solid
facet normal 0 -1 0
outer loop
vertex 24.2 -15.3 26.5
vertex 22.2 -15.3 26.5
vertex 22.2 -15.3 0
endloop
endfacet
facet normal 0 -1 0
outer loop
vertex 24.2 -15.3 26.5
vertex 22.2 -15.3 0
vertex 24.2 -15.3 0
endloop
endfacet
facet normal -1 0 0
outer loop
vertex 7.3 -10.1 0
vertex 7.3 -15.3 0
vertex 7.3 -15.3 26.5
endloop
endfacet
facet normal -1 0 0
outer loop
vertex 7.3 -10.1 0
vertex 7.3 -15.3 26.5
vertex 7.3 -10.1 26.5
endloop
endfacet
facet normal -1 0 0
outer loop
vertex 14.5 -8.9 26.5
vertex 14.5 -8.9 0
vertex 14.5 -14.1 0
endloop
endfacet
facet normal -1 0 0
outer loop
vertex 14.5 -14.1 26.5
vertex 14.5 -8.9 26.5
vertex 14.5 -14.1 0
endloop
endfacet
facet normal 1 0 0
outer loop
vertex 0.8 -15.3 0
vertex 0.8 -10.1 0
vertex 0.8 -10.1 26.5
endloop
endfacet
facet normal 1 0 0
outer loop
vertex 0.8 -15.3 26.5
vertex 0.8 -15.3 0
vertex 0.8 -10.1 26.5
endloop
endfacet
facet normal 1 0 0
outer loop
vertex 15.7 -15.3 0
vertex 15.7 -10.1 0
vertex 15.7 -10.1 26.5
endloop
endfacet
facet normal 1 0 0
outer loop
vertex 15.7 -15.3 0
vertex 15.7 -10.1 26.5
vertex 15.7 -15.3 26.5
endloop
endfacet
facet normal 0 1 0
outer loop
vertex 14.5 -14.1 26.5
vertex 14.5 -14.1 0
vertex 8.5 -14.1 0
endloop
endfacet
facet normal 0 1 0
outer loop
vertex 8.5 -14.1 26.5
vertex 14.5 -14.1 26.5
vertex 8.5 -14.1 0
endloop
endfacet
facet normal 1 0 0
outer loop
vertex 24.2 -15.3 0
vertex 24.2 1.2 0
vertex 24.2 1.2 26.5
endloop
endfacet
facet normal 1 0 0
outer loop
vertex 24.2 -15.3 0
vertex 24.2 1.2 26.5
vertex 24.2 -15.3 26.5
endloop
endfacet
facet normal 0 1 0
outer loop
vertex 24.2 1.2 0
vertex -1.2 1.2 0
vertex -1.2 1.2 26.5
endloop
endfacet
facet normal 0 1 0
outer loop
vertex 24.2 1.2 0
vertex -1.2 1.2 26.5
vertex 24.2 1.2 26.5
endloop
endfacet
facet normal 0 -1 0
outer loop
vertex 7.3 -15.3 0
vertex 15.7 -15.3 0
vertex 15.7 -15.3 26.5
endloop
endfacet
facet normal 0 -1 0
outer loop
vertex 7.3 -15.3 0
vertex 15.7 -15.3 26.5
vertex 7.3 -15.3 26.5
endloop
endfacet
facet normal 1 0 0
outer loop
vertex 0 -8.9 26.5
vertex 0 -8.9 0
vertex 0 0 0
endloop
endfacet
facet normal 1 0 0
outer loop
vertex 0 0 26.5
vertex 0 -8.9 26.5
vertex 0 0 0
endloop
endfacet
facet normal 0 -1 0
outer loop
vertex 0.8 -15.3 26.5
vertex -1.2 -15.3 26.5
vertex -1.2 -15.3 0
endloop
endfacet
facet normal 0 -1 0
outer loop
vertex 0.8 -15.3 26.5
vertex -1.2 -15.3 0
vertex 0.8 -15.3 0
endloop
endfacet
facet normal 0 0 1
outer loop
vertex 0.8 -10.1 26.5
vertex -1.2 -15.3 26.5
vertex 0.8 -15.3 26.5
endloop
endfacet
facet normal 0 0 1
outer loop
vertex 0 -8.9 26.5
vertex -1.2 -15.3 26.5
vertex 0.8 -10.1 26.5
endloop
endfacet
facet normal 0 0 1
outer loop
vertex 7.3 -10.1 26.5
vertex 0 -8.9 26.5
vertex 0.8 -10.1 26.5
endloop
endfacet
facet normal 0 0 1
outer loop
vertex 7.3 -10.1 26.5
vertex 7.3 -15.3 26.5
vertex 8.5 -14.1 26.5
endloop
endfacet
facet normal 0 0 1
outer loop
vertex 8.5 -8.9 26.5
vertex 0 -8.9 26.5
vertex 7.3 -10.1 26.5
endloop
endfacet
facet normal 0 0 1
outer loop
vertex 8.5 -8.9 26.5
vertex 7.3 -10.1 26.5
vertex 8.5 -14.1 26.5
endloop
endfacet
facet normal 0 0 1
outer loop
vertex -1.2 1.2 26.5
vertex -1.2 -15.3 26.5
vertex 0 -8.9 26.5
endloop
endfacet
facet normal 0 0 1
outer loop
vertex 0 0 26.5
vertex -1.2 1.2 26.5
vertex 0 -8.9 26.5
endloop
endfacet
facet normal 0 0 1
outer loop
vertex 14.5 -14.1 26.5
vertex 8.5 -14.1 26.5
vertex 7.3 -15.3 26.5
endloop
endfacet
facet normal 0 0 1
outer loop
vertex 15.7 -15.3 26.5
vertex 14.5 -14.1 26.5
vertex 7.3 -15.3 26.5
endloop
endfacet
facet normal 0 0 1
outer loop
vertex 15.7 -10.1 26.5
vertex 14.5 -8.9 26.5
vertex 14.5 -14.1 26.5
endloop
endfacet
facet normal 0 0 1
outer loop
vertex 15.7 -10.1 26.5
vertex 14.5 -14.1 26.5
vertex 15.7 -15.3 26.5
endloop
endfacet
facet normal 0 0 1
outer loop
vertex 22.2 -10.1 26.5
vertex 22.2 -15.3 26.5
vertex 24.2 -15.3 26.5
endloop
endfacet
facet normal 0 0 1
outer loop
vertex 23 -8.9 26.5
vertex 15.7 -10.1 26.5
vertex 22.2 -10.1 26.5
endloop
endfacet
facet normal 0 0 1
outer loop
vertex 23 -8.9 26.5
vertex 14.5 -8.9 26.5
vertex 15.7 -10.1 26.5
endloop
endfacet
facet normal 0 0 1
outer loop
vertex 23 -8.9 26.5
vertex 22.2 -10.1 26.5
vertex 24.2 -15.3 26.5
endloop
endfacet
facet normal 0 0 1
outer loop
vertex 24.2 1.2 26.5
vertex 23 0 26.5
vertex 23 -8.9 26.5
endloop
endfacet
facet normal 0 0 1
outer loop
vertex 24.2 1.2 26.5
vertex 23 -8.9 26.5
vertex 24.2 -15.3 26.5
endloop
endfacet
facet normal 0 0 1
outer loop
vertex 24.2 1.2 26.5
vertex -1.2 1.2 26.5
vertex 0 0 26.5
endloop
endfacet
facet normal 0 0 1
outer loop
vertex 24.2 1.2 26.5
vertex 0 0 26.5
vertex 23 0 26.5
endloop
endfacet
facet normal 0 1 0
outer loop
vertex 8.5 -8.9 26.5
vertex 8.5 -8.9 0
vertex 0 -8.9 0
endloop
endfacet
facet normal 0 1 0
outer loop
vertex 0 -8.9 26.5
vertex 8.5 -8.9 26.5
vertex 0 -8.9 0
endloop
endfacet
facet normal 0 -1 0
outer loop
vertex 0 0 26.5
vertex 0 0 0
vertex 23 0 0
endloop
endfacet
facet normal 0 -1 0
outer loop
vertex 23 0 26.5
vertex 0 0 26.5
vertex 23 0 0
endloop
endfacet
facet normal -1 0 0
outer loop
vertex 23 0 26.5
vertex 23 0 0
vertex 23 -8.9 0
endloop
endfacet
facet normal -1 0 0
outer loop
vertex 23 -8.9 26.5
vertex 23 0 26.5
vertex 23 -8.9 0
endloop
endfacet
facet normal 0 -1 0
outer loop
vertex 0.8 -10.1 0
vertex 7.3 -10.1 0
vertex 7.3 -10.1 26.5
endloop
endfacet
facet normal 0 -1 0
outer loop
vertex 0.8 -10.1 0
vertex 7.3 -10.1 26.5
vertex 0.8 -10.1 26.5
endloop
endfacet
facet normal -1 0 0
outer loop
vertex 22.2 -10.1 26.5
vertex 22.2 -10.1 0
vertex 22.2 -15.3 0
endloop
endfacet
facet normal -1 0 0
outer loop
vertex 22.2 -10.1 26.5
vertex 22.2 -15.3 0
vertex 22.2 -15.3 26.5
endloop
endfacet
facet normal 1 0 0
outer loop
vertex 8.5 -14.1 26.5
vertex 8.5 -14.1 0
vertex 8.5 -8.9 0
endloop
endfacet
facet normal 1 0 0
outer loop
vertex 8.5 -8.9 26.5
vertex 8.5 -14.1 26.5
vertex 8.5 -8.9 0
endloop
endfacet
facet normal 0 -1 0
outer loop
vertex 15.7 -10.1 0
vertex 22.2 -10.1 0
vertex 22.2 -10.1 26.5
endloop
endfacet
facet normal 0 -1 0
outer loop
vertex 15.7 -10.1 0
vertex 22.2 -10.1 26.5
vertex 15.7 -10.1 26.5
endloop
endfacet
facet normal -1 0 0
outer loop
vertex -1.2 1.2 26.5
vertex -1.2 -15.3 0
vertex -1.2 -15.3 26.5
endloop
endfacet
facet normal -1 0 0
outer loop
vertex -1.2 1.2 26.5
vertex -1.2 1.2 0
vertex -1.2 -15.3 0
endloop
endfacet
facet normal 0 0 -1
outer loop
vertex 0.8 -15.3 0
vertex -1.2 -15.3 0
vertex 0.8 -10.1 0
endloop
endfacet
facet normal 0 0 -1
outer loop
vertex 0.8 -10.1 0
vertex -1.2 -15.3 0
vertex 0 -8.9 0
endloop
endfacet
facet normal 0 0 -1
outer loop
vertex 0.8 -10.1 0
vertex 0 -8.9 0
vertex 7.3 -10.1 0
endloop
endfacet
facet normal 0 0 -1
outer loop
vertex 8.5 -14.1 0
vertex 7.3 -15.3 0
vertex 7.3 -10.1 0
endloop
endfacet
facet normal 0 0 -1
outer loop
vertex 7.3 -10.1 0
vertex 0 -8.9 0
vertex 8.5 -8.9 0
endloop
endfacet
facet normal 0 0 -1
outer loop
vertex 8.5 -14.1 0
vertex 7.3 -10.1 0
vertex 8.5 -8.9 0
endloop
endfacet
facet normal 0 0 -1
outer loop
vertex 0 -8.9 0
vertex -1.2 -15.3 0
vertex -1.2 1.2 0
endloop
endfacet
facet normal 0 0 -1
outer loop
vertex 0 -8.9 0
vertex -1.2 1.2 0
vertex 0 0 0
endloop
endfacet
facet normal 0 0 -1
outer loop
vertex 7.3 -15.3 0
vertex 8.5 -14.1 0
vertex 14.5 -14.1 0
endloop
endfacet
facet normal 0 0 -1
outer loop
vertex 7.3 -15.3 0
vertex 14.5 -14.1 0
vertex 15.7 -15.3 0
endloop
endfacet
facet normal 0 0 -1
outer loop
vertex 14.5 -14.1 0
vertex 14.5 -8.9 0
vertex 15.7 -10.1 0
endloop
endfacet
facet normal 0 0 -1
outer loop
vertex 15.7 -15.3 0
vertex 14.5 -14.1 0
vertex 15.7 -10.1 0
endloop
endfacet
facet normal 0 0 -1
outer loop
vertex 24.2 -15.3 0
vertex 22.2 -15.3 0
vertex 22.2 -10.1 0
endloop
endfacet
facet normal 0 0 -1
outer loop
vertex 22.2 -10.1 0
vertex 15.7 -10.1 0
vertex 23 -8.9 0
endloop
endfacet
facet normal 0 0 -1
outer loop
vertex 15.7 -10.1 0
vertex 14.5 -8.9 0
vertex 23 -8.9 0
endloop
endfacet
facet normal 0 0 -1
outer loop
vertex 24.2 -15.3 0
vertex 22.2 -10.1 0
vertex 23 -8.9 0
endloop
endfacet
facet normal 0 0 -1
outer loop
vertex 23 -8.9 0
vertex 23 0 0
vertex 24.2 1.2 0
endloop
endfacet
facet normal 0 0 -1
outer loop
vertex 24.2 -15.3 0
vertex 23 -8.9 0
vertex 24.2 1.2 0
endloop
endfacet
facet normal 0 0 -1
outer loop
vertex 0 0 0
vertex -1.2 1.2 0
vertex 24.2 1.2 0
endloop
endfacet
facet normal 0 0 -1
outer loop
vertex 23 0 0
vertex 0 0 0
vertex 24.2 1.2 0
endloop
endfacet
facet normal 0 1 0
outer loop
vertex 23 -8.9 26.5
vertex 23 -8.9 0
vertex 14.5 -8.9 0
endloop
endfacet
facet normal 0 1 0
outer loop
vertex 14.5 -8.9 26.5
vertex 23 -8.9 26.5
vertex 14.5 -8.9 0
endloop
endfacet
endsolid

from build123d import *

# Parameters (mm, degrees)
EXTRUDE_1_DEPTH = 26.5
SKETCH_2_W      = 2
SKETCH_2_H      = 26.5
EXTRUDE_2_DEPTH = 5.2


with BuildPart() as part:
    # 草图1 → 凸台-拉伸1 (new body)
    with BuildSketch(Plane.XY):
        Polygon((-1.2, 1.2), (24.2, 1.2), (24.2, -10.1), (15.7, -10.1), (15.7, -15.3), (7.3, -15.3), (7.3, -10.1), (-1.2, -10.1), align=None)
        Polygon((0, 0), (23, 0), (23, -8.9), (14.5, -8.9), (14.5, -14.1), (8.5, -14.1), (8.5, -8.9), (0, -8.9), align=None, mode=Mode.SUBTRACT)
    extrude(amount=EXTRUDE_1_DEPTH)

    # 草图2 → 凸台-拉伸2 (add)
    with BuildSketch(Plane.XZ.offset(10.1)):
        with Locations((-0.2, 13.25)):
            Rectangle(SKETCH_2_W, SKETCH_2_H)
        with Locations((23.2, 13.25)):
            Rectangle(SKETCH_2_W, SKETCH_2_H)
    extrude(amount=EXTRUDE_2_DEPTH)


solid = part.part
